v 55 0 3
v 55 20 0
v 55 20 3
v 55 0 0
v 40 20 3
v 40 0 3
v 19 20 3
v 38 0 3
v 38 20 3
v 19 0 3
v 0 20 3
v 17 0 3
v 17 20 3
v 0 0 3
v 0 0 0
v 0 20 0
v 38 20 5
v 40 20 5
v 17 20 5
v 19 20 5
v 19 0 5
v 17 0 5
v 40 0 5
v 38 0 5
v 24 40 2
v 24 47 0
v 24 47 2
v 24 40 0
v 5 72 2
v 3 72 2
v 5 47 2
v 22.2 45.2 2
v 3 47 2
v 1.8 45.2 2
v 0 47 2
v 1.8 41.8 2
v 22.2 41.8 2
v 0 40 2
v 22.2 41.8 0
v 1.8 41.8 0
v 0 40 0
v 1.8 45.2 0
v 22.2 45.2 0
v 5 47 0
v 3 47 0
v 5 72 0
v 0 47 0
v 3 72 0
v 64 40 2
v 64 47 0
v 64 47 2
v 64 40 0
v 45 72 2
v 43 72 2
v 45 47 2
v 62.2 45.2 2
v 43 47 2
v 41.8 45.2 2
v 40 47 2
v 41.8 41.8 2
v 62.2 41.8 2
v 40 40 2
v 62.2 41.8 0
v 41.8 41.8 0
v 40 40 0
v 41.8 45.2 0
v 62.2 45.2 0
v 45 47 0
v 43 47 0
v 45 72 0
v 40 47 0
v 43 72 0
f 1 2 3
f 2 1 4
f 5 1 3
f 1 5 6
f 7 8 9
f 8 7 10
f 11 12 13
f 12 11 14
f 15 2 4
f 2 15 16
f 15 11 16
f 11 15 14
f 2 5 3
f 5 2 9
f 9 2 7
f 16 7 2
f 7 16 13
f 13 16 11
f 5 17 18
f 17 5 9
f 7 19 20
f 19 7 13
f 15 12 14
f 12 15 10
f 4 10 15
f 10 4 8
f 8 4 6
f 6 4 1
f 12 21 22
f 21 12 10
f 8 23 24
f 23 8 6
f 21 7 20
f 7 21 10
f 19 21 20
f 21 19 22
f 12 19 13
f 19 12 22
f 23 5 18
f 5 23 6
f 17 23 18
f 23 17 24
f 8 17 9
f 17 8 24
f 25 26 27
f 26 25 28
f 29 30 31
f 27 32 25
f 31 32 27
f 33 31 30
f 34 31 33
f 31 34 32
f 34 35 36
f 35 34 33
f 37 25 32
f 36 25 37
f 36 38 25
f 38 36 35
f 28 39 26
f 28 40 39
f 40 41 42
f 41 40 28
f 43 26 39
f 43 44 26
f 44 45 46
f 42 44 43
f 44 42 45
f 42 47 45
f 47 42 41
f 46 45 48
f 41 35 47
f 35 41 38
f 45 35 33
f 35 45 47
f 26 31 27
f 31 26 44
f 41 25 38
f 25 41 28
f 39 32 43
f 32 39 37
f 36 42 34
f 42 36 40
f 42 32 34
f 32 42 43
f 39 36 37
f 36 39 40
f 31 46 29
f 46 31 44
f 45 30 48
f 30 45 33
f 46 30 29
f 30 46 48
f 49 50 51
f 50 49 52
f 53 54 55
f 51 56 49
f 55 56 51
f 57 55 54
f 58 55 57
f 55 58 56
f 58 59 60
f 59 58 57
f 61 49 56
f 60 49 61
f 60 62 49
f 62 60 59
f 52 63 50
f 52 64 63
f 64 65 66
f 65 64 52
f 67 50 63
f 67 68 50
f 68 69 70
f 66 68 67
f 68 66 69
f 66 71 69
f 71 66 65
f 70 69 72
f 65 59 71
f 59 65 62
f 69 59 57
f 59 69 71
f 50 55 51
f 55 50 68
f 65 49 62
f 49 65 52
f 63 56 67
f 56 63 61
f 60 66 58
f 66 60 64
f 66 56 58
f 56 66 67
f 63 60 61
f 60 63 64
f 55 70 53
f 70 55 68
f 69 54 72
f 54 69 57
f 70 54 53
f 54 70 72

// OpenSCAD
base_width = 55;
base_length = 20;
base_thick = 3;
base_leg_ofs = 15;

leg_hole_extra = 0.4;
leg_dim = 2;
leg_x_ofs = 3;
leg_len = 25;

module base() {
    cube([base_width, base_length, base_thick]);
    
    translate([base_leg_ofs + leg_dim, 0, base_thick])
    cube([leg_dim, base_length, leg_dim]);
    
    translate([base_width - base_leg_ofs - leg_dim, 0, base_thick])
    cube([leg_dim, base_length, leg_dim]);
}



module leg() {
    difference() {
        cube([base_length+leg_dim*2, base_thick+leg_dim*2, leg_dim]);
        translate([leg_dim-leg_hole_extra/2, leg_dim-leg_hole_extra/2, -0.1])
        cube([base_length+leg_hole_extra, base_thick+leg_hole_extra, leg_dim + 0.2]);
    }
    
    translate([leg_x_ofs, base_thick+leg_dim*2, 0])
    cube([leg_dim, leg_len, leg_dim]);
}

base();

translate([0, base_length*2, 0])
leg();

translate([base_length*2, base_length*2, 0])
leg();
